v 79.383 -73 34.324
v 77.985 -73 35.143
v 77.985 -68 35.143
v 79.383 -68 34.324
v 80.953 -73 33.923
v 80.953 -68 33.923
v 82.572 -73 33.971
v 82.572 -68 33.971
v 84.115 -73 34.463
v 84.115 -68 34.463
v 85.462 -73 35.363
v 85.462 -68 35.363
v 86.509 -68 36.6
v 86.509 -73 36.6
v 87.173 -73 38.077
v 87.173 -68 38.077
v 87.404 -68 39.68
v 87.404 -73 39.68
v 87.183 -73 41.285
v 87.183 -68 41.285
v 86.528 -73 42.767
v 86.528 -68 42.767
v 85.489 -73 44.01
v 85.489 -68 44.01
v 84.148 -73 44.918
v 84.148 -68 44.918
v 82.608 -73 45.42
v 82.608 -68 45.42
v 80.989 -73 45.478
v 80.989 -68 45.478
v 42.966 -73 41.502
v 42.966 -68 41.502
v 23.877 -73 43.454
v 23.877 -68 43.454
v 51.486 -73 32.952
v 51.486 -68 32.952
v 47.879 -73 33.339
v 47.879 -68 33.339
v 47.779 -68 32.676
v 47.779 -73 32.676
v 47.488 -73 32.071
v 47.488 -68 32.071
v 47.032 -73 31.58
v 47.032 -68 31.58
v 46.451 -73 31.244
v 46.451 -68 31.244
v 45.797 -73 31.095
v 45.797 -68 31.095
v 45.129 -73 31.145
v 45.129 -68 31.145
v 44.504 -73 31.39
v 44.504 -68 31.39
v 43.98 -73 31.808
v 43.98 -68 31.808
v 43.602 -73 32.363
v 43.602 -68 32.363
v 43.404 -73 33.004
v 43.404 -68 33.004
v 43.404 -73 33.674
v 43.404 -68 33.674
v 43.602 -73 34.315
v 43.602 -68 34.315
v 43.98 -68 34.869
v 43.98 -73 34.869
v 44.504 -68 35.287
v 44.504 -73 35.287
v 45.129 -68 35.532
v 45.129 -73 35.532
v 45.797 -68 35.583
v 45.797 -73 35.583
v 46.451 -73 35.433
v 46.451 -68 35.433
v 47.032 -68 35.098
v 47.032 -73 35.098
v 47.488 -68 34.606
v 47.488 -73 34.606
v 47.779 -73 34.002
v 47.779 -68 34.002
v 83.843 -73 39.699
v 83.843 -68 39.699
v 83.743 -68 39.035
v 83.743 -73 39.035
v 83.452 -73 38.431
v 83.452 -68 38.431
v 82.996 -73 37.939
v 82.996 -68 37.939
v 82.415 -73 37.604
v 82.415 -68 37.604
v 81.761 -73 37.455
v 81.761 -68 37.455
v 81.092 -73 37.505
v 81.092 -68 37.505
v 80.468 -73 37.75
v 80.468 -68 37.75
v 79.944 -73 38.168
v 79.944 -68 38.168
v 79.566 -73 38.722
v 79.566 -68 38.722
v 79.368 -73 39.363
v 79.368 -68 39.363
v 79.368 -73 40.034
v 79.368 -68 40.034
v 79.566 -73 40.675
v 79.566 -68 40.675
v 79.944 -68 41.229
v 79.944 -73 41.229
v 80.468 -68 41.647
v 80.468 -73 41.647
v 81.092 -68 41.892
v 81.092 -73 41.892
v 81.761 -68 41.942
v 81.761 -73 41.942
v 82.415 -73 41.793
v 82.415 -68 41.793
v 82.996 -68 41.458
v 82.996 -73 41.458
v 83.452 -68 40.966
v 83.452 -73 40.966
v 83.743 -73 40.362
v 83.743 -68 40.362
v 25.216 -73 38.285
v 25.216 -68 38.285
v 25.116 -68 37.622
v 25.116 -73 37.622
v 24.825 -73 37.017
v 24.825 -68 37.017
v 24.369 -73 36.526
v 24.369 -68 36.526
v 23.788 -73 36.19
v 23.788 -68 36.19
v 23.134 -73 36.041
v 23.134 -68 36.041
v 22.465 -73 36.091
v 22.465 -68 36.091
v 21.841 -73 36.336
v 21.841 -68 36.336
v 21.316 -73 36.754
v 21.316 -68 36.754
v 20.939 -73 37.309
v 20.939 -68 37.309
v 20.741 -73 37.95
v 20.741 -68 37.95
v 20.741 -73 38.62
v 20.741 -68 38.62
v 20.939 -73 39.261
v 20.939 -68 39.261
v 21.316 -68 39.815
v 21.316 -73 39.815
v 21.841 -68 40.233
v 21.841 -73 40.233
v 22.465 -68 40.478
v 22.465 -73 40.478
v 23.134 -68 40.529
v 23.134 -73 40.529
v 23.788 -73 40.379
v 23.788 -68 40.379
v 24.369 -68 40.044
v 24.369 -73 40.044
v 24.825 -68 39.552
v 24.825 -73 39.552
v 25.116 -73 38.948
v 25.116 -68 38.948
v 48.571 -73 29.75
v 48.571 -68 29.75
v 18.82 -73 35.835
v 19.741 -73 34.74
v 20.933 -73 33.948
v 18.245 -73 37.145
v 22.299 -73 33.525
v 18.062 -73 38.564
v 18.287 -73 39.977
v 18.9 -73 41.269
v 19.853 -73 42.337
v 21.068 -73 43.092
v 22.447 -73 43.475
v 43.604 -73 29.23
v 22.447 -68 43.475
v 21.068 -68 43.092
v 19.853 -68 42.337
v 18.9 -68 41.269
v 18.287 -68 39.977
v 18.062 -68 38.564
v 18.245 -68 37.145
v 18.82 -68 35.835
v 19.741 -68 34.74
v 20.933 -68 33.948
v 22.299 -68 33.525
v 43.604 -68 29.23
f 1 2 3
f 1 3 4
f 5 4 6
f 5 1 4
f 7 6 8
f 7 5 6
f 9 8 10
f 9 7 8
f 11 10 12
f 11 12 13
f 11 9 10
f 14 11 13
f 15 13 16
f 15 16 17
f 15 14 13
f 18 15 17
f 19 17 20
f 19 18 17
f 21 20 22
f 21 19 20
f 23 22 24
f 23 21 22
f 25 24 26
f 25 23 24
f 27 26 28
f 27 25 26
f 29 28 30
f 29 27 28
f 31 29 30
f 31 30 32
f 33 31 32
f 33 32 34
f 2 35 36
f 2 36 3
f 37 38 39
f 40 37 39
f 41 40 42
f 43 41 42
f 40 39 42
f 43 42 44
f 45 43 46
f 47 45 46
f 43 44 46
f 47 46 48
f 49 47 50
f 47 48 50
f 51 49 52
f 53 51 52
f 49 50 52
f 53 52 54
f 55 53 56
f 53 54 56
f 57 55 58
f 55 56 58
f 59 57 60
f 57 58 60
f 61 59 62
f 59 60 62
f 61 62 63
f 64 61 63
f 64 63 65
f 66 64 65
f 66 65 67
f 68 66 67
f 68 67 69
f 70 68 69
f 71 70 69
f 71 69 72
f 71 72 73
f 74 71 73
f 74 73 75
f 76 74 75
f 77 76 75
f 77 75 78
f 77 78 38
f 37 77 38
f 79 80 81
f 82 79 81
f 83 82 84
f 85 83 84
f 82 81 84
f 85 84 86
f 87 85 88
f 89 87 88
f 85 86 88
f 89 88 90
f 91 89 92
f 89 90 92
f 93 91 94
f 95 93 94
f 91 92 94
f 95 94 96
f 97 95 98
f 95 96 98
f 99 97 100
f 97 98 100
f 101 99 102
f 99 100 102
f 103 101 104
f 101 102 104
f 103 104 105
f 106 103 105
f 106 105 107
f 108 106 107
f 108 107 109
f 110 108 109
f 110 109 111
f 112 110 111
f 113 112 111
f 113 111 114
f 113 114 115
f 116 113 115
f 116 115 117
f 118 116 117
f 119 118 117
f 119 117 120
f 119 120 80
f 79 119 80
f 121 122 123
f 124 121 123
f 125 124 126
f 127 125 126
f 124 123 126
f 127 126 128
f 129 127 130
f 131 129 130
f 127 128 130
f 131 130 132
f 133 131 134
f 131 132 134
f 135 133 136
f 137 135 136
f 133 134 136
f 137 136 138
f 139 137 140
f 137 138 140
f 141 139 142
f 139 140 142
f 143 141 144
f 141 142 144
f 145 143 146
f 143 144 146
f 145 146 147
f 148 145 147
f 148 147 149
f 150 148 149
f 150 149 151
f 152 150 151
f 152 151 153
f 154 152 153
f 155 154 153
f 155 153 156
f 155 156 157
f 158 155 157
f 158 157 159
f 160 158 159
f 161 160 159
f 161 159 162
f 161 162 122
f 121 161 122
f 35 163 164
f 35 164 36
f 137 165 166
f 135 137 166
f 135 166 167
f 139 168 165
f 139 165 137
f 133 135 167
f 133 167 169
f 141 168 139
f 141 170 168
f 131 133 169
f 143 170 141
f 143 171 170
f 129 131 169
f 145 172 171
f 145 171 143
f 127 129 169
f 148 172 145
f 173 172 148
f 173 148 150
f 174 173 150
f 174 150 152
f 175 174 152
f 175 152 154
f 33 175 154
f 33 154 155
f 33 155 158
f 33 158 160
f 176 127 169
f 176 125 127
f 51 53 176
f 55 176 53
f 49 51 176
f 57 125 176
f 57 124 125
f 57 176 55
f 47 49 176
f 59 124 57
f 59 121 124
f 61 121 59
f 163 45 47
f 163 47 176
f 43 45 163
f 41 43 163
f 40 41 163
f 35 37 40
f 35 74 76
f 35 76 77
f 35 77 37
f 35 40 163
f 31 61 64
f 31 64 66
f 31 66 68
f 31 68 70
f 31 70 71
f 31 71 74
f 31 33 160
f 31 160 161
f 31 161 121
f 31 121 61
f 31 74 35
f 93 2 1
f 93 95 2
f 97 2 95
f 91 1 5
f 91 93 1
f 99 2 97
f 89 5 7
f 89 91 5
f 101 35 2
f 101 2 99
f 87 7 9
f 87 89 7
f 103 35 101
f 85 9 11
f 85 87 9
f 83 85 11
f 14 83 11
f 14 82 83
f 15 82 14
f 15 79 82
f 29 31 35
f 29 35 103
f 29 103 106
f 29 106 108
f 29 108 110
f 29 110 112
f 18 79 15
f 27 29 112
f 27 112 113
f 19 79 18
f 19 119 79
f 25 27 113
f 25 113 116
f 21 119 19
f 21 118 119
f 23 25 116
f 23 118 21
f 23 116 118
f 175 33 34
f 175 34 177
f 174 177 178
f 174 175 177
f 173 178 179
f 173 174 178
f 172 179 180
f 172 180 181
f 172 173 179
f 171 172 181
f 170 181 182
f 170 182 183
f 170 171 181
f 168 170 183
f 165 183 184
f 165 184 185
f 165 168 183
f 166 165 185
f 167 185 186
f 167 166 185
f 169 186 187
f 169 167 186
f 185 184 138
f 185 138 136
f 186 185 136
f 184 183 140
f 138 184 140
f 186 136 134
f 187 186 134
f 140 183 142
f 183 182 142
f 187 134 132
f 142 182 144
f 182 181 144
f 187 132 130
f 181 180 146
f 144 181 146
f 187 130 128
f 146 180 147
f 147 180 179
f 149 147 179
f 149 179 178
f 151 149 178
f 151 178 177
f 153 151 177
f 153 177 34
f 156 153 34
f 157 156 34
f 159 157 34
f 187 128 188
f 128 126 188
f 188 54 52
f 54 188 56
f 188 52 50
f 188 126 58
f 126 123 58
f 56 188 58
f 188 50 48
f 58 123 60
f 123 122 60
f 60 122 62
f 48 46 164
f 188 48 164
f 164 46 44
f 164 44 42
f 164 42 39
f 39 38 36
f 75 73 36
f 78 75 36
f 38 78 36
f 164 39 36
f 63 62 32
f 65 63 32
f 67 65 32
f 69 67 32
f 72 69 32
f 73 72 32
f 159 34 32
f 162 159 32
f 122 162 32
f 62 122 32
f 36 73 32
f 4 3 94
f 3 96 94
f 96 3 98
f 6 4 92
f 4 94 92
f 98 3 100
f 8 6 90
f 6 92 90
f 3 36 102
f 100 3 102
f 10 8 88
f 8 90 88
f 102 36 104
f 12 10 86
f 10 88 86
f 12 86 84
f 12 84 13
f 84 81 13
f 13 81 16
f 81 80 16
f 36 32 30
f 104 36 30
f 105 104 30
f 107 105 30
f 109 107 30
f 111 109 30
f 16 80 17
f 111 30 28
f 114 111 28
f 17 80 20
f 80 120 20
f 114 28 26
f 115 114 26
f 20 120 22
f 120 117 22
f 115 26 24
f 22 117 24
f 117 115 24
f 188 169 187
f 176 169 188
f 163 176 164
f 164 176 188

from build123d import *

# Parameters (mm, degrees)
BOSS_EXTRUDE1_DEPTH        = 5
F_4_5_4_5_DIAMETER_HOLE1_D = 4.5
F_4_5_4_5_DIAMETER_HOLE2_D = 4.5
CHAMFER3_SIZE              = 1.737611999
CHAMFER3_SIZE2             = 3.873994542
SKETCH18_R                 = 2.25
CUT_EXTRUDE1_DEPTH         = 10


with BuildPart() as part:
    # Sketch1 → Boss-Extrude1 (new body)
    with BuildSketch(Plane.XZ.offset(73)):
        with BuildLine():
            Line((47.401706558, 28.464616212), (51.486447787, 32.952250014))
            Line((51.486447787, 32.952250014), (77.985492495, 35.143180318))
            ThreePointArc((77.985492495, 35.143180318), (87.173153133, 38.077045167), (80.988712415, 45.477948081))
            Line((80.988712415, 45.477948081), (42.966330666, 41.501731436))
            Line((42.966330666, 41.501731436), (23.877297166, 43.453769804))
            ThreePointArc((23.877297166, 43.453769804), (18.123943846, 39.278307812), (22.299405838, 33.524954492))
            Line((22.299405838, 33.524954492), (47.401706558, 28.464616212))
        make_face()
    extrude(amount=-BOSS_EXTRUDE1_DEPTH)

    # Ø4.5 (4.5) Diameter Hole1 (through all)
    with Locations(Plane(origin=(0, -73, 0), x_dir=(-1, 0, 0), z_dir=(0, -1, 0))):
        with Locations((-45.629259616, -33.33886952)):
            Hole(F_4_5_4_5_DIAMETER_HOLE1_D / 2)

    # Ø4.5 (4.5) Diameter Hole2 (through all)
    with Locations(Plane(origin=(0, -73, 0), x_dir=(-1, 0, 0), z_dir=(0, -1, 0))):
        with Locations((-22.965684709, -38.284870865)):
            Hole(F_4_5_4_5_DIAMETER_HOLE2_D / 2)

    # Chamfer3
    chamfer3_edges = [part.edges().sort_by_distance(p)[0] for p in [
        (47.401706558, -70.5, 28.464616212),
    ]]
    chamfer3_side = [part.faces().sort_by_distance(p)[0] for p in [
        (49.444077173, -70.5, 30.708433113),
    ]]
    chamfer(chamfer3_edges, length=CHAMFER3_SIZE, length2=CHAMFER3_SIZE2, reference=chamfer3_side[0])

    # Sketch18 → Cut-Extrude1 (cut)
    with BuildSketch(Plane(origin=(0, -68, 0), x_dir=(1, 0, 0), z_dir=(0, 1, 0))):
        with Locations((81.593094218, -39.698575952)):
            Circle(SKETCH18_R)
    extrude(amount=-CUT_EXTRUDE1_DEPTH, mode=Mode.SUBTRACT)


solid = part.part
